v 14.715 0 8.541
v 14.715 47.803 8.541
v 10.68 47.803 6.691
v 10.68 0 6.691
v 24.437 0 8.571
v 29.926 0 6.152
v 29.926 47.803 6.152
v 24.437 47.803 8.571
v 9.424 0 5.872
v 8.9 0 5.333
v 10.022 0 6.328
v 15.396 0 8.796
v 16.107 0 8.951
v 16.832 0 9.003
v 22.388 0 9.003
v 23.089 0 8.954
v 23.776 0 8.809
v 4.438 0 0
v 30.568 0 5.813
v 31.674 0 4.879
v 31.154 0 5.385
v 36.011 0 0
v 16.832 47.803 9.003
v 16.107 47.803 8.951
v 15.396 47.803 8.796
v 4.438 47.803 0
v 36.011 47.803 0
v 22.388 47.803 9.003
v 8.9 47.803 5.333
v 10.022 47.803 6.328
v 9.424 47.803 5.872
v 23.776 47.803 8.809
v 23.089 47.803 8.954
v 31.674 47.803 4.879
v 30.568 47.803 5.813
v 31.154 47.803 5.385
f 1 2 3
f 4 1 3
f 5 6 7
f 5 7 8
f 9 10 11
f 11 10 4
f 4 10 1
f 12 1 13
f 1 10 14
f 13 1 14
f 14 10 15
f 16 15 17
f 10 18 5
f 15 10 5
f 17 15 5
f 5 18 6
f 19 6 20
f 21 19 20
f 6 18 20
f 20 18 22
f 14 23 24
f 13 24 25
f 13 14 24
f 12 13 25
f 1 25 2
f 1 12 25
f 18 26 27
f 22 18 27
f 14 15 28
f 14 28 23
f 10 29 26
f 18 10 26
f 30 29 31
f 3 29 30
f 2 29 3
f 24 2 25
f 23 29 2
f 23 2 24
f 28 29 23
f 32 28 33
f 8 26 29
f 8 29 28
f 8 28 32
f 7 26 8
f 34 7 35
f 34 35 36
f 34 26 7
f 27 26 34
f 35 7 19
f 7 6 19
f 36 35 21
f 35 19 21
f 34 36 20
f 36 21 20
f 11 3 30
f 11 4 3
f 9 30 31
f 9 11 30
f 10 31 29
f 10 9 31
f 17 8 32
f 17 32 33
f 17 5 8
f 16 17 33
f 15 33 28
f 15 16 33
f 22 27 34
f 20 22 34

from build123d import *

# Parameters (mm, degrees)
F0_W     = 34.9964526249
F0_H     = 47.8031225502
F1_DEPTH = 24.638
F3_DEPTH = 25.4
F4_DEPTH = 89.408
F5_R     = 5.08
F6_R     = 5.08


with BuildPart() as f1:
    # F0 (on Top) → F1 (new body)
    with BuildSketch(Plane.XY):
        with Locations((18.5126164579, 23.9015612751)):
            Rectangle(F0_W, F0_H)
    extrude(amount=F1_DEPTH)

    # F2 (on face) → F3 (join)
    with BuildSketch(Plane(origin=(0, 47.8031225502, 0), x_dir=(-1, 0, 0), z_dir=(0, 1, 0))):
        Polygon((-36.0108427703, 24.638), (-36.0108427703, 0), (-30.9388898313, 5.7059428655), (-23.4577655792, 9.0027097613), (-15.7230421901, 9.0027097613), (-9.6367038786, 6.21313788), (-4.437955562, 0), (-1.0143901454, 0), (-1.0143901454, 24.638), align=None)
    extrude(amount=F3_DEPTH)

    # F4 (cut): a face of the model
    f4_faces = [f1.faces().sort_by_distance(p)[0] for p in [
        (18.0448789955, 73.2031225502, 14.9299983871),
    ]]
    extrude(f4_faces, amount=-F4_DEPTH, mode=Mode.SUBTRACT)

    # F5
    f5_edges = [f1.edges().sort_by_distance(p)[0] for p in [
        (23.457766, 23.901561, 9.00271),
    ]]
    fillet(f5_edges, radius=F5_R)

    # F6
    f6_edges = [f1.edges().sort_by_distance(p)[0] for p in [
        (15.723042, 23.901561, 9.00271),
        (9.636704, 23.901561, 6.213138),
        (30.93889, 23.901561, 5.705943),
    ]]
    fillet(f6_edges, radius=F6_R)


solid = f1.part
